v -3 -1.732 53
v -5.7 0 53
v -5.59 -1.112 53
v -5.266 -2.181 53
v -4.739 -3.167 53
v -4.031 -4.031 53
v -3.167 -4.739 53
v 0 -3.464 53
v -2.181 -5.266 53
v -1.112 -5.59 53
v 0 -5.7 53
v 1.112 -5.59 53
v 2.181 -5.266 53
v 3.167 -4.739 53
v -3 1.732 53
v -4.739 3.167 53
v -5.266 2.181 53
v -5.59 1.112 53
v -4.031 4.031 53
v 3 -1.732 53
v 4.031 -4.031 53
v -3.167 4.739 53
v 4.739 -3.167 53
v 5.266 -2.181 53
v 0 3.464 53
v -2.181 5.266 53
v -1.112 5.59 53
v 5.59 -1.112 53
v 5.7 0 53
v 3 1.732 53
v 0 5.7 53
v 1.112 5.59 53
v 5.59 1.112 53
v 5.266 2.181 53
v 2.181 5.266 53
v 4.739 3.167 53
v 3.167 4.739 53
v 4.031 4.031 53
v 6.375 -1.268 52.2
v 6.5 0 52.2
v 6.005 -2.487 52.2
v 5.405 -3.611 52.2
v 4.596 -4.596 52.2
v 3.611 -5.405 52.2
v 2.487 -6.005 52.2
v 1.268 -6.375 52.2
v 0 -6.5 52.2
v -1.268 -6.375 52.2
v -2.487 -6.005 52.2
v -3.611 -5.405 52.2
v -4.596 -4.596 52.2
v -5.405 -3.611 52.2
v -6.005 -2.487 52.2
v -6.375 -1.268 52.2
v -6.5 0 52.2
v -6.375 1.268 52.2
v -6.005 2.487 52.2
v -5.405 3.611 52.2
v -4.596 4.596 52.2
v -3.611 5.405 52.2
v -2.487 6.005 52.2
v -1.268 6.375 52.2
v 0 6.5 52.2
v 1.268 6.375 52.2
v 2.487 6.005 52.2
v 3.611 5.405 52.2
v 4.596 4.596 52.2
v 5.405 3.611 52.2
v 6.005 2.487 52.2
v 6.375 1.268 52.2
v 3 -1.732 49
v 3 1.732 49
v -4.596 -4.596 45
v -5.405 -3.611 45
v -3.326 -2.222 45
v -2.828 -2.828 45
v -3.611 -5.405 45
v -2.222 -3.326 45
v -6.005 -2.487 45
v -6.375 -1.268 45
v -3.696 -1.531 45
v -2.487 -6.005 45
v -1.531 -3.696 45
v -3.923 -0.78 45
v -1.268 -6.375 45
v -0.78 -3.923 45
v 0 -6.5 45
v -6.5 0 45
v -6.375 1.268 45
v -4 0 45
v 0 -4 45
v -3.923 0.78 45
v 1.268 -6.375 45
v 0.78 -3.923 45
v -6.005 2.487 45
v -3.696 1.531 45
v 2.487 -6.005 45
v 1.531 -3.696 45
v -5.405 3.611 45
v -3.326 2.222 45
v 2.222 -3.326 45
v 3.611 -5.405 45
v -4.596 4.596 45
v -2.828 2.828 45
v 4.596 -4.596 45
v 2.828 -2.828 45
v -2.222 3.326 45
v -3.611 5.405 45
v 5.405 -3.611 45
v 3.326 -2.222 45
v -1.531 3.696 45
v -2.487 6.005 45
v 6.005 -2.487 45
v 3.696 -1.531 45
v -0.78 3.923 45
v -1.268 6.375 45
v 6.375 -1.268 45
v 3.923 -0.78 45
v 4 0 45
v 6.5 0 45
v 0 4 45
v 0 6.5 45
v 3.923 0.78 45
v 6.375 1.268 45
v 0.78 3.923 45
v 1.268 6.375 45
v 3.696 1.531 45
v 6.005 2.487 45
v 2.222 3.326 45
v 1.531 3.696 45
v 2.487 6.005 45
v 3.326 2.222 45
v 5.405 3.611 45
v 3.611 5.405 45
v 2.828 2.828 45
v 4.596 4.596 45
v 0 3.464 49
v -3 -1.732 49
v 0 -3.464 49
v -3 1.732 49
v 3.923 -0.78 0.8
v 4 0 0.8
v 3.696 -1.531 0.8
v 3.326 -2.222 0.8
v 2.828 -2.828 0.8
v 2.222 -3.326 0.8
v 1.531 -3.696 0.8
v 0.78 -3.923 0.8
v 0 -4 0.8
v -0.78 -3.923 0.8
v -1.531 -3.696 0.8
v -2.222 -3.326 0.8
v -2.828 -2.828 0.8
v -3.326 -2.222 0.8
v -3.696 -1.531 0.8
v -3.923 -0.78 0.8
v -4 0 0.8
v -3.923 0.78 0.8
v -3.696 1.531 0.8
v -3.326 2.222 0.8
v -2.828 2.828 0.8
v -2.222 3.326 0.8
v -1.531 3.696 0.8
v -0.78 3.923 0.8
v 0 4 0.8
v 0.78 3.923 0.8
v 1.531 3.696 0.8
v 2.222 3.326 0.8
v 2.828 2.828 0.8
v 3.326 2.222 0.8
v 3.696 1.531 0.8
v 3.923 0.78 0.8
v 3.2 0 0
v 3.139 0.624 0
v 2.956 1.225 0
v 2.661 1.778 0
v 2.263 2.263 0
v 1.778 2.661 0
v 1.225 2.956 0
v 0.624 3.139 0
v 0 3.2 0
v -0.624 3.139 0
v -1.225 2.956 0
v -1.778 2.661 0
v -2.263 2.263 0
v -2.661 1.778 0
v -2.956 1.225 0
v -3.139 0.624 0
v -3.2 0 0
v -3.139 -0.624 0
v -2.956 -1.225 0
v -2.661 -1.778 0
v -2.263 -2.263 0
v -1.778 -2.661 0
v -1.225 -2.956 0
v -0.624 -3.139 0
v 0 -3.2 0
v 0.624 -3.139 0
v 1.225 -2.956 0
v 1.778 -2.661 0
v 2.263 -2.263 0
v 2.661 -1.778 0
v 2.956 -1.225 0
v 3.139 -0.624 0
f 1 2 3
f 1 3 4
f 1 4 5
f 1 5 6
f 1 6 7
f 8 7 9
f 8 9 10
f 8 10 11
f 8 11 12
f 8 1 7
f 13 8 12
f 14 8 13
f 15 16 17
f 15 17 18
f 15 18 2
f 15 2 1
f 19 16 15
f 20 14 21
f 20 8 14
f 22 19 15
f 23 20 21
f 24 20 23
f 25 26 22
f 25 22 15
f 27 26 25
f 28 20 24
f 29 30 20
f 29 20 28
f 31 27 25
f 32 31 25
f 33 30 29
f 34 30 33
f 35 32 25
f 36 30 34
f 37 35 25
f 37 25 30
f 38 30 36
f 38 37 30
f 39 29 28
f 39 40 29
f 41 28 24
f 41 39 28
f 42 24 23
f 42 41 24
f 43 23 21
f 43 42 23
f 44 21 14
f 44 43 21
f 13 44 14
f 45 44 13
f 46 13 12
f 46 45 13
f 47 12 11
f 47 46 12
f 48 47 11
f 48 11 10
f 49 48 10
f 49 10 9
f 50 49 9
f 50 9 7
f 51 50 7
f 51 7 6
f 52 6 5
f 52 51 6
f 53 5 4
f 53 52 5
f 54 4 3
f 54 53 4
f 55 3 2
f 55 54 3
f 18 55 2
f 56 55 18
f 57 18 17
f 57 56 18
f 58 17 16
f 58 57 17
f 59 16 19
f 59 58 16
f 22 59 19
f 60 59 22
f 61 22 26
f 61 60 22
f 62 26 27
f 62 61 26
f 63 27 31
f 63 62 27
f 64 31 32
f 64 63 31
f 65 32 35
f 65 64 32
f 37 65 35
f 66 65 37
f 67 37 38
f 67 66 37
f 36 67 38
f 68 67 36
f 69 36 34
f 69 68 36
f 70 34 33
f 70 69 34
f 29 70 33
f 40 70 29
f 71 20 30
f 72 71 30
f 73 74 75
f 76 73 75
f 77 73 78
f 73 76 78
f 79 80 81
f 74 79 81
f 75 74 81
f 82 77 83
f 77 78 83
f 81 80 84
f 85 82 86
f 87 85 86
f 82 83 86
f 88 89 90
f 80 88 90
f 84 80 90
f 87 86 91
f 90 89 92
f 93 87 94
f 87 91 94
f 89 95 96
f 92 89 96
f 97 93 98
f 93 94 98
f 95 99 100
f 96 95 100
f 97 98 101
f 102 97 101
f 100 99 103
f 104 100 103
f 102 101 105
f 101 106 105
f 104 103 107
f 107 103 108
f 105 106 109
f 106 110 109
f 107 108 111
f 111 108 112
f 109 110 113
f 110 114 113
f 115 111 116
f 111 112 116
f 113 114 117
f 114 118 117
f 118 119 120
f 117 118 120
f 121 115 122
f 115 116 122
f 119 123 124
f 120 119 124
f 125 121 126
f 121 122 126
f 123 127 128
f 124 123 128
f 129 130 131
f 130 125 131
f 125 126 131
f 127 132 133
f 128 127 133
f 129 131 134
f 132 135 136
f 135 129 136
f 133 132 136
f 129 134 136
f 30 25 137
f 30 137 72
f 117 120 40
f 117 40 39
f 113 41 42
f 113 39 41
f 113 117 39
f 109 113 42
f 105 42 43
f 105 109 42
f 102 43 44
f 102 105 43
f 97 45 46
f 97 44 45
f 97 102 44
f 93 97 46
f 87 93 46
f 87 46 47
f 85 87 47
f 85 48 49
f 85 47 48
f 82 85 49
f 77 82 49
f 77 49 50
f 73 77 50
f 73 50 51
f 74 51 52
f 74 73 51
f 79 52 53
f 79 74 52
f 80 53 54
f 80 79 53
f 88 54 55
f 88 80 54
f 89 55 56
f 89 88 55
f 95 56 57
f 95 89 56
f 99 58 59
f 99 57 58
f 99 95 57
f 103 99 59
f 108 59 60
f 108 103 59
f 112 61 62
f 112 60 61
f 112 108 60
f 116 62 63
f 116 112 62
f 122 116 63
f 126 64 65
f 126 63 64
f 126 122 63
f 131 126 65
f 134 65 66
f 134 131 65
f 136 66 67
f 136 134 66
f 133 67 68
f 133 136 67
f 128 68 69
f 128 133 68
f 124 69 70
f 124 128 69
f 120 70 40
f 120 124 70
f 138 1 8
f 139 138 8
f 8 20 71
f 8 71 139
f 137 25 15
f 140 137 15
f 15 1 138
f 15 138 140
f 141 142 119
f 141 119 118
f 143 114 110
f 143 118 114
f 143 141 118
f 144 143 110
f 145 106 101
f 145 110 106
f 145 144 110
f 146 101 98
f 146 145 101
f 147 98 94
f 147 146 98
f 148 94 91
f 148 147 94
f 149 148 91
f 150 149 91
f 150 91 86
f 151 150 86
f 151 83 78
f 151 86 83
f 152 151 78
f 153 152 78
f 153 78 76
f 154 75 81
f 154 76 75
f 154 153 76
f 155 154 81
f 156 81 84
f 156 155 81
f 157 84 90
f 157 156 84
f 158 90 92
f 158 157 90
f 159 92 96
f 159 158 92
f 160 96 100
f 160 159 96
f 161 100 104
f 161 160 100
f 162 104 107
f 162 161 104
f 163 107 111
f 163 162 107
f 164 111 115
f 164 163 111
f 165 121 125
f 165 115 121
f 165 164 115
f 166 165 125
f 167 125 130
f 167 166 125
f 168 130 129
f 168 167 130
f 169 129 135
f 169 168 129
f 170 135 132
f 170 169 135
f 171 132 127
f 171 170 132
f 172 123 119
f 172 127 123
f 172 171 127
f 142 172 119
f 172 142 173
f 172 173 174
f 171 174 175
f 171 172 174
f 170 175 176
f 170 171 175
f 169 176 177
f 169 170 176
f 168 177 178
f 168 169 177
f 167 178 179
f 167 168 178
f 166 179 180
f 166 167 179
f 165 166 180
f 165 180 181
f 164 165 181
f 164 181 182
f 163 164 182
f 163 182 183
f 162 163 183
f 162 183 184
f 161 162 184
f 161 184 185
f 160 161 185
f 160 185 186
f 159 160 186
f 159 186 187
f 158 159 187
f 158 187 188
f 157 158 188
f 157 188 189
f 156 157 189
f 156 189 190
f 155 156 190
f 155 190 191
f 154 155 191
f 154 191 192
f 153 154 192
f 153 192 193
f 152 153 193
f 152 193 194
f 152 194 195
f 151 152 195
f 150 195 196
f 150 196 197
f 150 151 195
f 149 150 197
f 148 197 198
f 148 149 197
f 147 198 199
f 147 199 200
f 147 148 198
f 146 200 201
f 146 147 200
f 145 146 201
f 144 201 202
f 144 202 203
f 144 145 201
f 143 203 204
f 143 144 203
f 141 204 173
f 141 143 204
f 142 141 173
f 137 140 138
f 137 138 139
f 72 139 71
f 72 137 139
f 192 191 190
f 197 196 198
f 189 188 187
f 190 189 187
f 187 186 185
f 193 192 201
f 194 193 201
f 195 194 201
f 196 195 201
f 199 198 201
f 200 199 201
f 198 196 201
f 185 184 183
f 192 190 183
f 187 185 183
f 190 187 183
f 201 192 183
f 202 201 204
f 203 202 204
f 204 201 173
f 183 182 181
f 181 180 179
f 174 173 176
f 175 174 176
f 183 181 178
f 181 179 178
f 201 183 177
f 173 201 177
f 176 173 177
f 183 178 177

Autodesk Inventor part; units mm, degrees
ref_plane "YZ Plane" through (0, 0, 0) normal (1, 0, 0) x (0, 1, 0)
ref_plane "XZ Plane" through (0, 0, 0) normal (0, 1, 0) x (-1, 0, 0)
ref_plane "XY Plane" through (0, 0, 0) normal (0, 0, 1) x (1, 0, 0)
sketch "Sketch1" plane through (0, 0, 0) normal (0, 0, 1) x (1, 0, 0)
  circle A0 centre (0, 0) radius 4
  dimension "Diameter" = 8
extrude "Extrusion1" add sketch "Sketch1" along normal blind 45
sketch "Sketch2" plane through (0, 0, 45) normal (0, 0, 1) x (1, 0, 0)
  circle A0 centre (0, 0) radius 4 projected
  circle A1 centre (0, 0) radius 6.5
  dimension "Head_Diameter" = 13
extrude "Extrusion2" add sketch "Sketch2" along normal blind 8 contours A0 | A1
sketch "Sketch3" plane through (0, 0, 53) normal (0, 0, 1) x (1, 0, 0)
  circle A0 centre (0, 0) radius 6.5 projected
  circle A1 centre (0, 0) radius 3.4641 construction
  line L0 (0, 3.4641) -> (3, 1.7321)
  line L1 (3, -1.7321) -> (3, 1.7321)
  line L2 (0, 3.4641) -> (-3, 1.7321)
  line L3 (-3, -1.7321) -> (-3, 1.7321)
  line L4 (-3, -1.7321) -> (0, -3.4641)
  line L5 (3, -1.7321) -> (0, -3.4641)
  dimension "Hex_Width" = 6
extrude "Extrusion3" cut sketch "Sketch3" against normal blind 4 contours L0 L1 L5 L4 L3 L2
thread "Thread1" size "M8x1.25" class "4g6g" standard "ANSI Metric M Profile" length 30
chamfer "Chamfer1" distance 0.8 angle 45 2 edges at (-6.5, 0, 53) (-4, 0, 0)
equation "\"d12\" = Chamfer"
equation "\"ThreadLength\" = 16"
equation "\"Chamfer\" = 0.8"
properties part number "SCREW,SOCKET HD,P,12.9,M8X1.25X45MM"
